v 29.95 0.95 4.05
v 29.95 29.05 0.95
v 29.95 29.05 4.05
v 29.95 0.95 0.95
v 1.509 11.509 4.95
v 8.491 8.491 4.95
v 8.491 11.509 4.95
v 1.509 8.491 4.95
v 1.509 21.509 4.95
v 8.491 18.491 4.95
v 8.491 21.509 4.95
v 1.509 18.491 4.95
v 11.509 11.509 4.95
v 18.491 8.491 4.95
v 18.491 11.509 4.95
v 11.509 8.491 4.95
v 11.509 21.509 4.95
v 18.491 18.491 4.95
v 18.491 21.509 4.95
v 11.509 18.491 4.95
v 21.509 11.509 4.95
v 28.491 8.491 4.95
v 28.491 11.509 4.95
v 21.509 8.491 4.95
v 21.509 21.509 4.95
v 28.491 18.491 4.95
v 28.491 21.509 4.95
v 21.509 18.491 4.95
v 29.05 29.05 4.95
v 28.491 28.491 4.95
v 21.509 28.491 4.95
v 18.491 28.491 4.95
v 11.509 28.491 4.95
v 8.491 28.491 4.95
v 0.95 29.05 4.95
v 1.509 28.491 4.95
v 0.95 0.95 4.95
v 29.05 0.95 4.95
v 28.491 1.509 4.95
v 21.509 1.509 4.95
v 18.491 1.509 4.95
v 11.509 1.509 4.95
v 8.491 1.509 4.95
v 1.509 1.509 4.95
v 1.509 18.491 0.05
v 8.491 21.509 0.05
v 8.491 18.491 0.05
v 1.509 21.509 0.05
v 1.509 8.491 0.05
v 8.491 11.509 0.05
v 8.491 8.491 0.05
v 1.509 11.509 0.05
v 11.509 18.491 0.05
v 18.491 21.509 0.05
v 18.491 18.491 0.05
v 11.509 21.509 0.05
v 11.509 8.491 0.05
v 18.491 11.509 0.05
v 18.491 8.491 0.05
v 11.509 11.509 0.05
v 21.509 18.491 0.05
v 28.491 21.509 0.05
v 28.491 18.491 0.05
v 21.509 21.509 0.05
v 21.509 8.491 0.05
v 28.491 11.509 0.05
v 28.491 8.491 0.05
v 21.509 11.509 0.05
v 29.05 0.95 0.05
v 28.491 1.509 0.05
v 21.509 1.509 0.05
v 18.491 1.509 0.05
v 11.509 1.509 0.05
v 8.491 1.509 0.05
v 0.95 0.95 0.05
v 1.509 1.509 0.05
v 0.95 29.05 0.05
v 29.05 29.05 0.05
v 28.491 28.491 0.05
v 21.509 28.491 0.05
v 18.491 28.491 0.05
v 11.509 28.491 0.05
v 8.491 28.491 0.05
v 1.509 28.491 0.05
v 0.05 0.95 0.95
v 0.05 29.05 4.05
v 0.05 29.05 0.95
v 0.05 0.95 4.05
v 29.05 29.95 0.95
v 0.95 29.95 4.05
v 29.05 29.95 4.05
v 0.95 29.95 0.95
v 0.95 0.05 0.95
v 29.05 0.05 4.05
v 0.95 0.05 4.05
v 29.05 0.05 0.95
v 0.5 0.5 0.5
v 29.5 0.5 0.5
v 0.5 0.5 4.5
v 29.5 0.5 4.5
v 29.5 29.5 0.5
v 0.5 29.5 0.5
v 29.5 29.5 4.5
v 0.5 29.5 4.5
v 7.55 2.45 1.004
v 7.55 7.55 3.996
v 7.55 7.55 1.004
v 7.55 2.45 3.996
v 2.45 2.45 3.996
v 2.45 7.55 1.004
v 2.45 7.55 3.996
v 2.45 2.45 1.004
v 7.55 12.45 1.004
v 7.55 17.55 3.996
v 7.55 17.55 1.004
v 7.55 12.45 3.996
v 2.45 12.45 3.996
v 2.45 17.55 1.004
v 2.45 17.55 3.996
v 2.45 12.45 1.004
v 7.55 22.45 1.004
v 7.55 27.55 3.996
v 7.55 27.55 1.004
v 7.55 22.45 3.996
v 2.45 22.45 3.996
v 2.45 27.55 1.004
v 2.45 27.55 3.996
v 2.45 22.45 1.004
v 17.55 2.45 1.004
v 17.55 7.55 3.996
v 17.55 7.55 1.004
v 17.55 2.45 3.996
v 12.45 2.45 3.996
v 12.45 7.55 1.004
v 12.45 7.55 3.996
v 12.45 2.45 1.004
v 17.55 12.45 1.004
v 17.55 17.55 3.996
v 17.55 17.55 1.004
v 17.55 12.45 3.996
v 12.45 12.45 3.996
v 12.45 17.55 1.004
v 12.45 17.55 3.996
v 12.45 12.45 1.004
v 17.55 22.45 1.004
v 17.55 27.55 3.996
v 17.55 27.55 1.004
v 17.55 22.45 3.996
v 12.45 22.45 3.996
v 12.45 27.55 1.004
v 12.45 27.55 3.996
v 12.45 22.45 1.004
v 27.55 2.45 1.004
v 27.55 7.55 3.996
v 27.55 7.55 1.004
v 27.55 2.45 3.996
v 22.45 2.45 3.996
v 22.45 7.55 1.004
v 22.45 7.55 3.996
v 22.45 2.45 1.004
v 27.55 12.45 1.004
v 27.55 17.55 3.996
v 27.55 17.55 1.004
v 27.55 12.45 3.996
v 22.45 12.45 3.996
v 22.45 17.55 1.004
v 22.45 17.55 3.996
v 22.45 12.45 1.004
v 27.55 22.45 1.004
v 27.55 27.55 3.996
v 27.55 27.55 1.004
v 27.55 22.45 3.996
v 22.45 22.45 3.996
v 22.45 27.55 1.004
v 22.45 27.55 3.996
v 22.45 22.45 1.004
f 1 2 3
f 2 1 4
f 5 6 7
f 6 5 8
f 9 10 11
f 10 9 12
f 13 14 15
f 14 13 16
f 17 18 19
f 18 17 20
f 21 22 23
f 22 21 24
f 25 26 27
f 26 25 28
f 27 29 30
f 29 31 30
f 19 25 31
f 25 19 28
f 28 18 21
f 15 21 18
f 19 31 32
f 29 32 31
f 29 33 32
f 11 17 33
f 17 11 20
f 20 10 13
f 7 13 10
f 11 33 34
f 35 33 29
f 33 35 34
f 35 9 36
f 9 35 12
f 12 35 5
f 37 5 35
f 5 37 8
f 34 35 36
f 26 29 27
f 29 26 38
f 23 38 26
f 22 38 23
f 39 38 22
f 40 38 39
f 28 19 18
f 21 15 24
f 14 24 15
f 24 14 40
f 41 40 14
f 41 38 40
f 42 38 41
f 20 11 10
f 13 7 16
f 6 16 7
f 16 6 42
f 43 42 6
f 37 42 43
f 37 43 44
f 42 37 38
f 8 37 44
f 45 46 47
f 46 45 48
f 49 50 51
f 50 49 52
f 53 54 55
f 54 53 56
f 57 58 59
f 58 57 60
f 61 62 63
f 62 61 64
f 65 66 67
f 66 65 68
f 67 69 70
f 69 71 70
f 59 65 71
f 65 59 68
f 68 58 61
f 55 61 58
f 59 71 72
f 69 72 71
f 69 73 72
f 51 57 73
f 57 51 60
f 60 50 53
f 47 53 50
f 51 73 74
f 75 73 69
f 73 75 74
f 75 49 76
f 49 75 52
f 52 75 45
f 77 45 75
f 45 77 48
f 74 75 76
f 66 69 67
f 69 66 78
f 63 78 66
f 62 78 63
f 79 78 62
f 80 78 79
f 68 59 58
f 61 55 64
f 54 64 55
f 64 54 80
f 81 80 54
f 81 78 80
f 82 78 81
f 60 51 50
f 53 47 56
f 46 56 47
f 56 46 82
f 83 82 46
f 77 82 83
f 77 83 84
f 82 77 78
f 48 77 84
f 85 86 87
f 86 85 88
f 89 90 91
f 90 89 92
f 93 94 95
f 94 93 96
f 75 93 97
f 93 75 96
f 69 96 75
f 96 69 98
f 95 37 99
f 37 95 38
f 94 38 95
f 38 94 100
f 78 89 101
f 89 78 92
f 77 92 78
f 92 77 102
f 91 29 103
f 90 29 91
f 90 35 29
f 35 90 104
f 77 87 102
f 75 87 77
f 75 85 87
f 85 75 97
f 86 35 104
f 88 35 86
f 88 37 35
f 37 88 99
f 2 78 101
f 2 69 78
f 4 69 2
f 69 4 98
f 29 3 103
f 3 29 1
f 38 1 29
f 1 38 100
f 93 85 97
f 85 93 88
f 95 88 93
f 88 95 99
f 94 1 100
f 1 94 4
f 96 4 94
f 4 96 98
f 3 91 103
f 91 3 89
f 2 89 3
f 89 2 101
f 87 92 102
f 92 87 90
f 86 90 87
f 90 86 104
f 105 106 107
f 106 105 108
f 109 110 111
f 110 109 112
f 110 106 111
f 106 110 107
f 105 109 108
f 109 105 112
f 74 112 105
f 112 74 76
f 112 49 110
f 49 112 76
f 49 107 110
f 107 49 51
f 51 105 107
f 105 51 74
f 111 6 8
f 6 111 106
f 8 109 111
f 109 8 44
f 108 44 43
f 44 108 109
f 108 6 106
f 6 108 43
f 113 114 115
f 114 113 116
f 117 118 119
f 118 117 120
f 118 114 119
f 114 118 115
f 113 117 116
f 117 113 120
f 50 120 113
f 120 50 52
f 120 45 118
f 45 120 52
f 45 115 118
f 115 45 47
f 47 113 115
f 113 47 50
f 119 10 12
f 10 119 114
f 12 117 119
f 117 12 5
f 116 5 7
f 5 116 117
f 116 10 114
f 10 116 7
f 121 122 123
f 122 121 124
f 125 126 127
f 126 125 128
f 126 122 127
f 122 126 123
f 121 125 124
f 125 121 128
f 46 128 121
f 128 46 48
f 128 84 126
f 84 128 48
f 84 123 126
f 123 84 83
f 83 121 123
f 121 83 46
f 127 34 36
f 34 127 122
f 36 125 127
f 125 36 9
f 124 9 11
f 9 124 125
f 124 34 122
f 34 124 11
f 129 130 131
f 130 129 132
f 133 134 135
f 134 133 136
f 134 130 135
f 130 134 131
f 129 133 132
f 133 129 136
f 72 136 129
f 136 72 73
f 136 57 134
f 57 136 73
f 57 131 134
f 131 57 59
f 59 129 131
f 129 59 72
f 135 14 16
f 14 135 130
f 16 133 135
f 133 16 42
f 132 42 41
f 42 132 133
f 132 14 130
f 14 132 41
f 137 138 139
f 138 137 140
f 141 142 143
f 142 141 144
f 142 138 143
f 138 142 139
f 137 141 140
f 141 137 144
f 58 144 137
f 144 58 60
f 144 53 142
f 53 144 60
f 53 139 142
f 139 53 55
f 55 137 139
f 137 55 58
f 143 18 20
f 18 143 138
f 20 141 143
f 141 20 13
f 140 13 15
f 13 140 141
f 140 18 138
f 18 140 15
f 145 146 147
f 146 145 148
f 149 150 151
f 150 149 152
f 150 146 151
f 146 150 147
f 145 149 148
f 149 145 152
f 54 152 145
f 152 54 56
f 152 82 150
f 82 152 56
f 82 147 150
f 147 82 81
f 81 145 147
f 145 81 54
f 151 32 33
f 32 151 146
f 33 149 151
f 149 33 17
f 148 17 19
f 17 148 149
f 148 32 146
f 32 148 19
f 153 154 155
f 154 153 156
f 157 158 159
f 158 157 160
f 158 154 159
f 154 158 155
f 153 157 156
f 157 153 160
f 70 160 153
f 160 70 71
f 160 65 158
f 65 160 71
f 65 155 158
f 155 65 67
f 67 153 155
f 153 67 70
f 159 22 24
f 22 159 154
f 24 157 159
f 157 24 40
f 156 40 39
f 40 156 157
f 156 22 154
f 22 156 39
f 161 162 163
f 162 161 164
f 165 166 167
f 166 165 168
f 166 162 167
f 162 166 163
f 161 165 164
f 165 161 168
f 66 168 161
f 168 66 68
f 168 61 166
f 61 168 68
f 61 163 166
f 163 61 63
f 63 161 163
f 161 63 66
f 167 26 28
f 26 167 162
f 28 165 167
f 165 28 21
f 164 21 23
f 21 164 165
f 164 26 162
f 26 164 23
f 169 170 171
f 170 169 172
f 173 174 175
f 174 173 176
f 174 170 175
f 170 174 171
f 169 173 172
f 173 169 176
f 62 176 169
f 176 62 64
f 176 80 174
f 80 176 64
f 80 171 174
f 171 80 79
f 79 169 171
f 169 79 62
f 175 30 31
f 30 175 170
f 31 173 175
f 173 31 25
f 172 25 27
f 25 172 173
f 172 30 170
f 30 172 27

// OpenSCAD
/* [HIDDEN] */
//QUALITY
$fn = 40;
D = 0.05;
F = 1.0;
// PLANE
H = 5;
W = 10;
// CLIP
CLIP = 5;
CLIP_F = 0.5;
CLIP_W = 1.5;
CLIP_L = 4.2;
// WHEEL
WHEEL_OUT_D = 52;
WHEEL_W = 3;
WHEEL_H = 20;
WHEEL_ARM_N = 5;
WHEEL_ARM_W = 4;
WHEEL_ARM_H = 10;
WHEEL_GEAR_N = 18;
// WHEEL PIN
WHEEL_PIN_D = 5.4;
WHEEL_PIN_L = 20;
// BEARING 688
BEAR_OUT_D = 16;
BEAR_IN_D = 8;
BEAR_H = 5;
// DC MOTOR
DC_PIN_D = 5.4;
DC_PIN_W = 3.6;
// SERVO
SERVO_D = 7.4;
SORVO_S = 2.2;
SERVO_T = 0.4;

/* [MODULES] */
MODULE = 2; // [1:Clips, 2:Plane, 3:Corner, 4:Servo Mount, 5:Servo Bracet, 6:Servo Pin, 7:Control Unit, 8:Control Unit Cap, 9:Battery Block, 10:Battery Block Cap]
/* [PARAMETERS] */
ROWS = 3; // [1:20]
COLS = 3; // [1:20]
ROWS_CORNER = 3; // [1:10]
HEIGHT = 1; // [1:0.5:10]


if (MODULE == 1){
    clips();
} else if (MODULE == 2){
    plane(ROWS, COLS, HEIGHT);
} else if (MODULE == 3){
    corner(ROWS, ROWS_CORNER, COLS);
} else if (MODULE == 4){
    servo_joint();
} else if (MODULE == 5){
    servo_bracet();
} else if (MODULE == 6){
    servo_pin();
} else if (MODULE == 7){
    control_block();
} else if (MODULE == 8){
    control_block_cap();
} else if (MODULE == 9){
    battery_block();
} else if (MODULE == 10){
    battery_cap();
} 

// UTILS:
// 1. clip_gap();
// 2. solid_plane(r, c);
// 3. bevel(r, c, h);
// 4. pyramid4(a, h);
// 5. prizm3rect(a, h);

module control_block_cap(){
    difference(){
        plane(9, 9, 1.2);
        translate([0, 0, 4.95])
            cube([11, 11, 1.1]);
        translate([79, 0, 4.95])
            cube([11, 11, 1.1]);
        translate([0, 79, 4.95])
            cube([11, 11, 1.1]);
        translate([79, 79, 4.95])
            cube([11, 11, 1.1]);
    }
}

module battery_cap(){
    difference(){
        union(){
            plane(5,9);
            translate([1,1,0.05])
                cube([8,8,4.9]);
            translate([41,1,0.05])
                cube([8,8,4.9]);
            translate([1,81,0.05])
                cube([8,8,4.9]);
            translate([41,81,0.05])
                cube([8,8,4.9]);
        }
        translate([3, 3, 0])
            cylinder(d=2.5, h=10, center=true);
        translate([3, 90-3, 0])
            cylinder(d=2.5, h=10, center=true);
        translate([50-3, 3, 0])
            cylinder(d=2.5, h=10, center=true);
        translate([50-3, 90-3, 0])
            cylinder(d=2.5, h=10, center=true);
        translate([2.5,2.5,2.5])
            cylinder(d=10, h=3);
        translate([50-2.5,2.5,2.5])
            cylinder(d=10, h=3);
        translate([2.5,90-2.5,2.5])
            cylinder(d=10, h=3);
        translate([50-2.5,90-2.5,2.5])
            cylinder(d=10, h=3);
    }
}

module battery_block(){
    difference(){
        union(){
            difference(){
                plane(5,9, 7);
                translate([4.5, 5, 7])
                    cube([41, 80, 28]);
                translate([6, 0, 6])
                    cube([38, 5.1, 28]);
                translate([6, 84.9, 6])
                    cube([38, 5.1, 28]);
                translate([0, 6, 6])
                    cube([5.0, 78, 28]);
                translate([45, 6, 6])
                    cube([5.0, 78, 28]);
            }
            
            translate([5, 5, 5])
                rotate([90, 0, 0])
                    plane(4, 3);
            translate([5, 90, 5])
                rotate([90, 0, 0])
                    plane(4, 3);
            translate([5, 5, 5])
                rotate([0,-90,0])
                    plane(3,8);
            translate([50, 5, 5])
                rotate([0,-90,0])
                    plane(3,8);
        }
        translate([4.5, 5, 7])
            cube([41, 80, 28]);
        
        translate([21, 0, 0])
            cube([8, 9, 5]);
        translate([21, 5, 0])
            cube([8, 5, 10]);
        
        translate([21, 81, 0])
            cube([8, 9, 5]);
        translate([21, 80, 0])
            cube([8, 5, 10]);
        
        translate([3, 3, 35])
            cylinder(d=2.5, h=10, center=true);
        translate([3, 90-3, 35])
            cylinder(d=2.5, h=10, center=true);
        translate([50-3, 3, 35])
            cylinder(d=2.5, h=10, center=true);
        translate([50-3, 90-3, 35])
            cylinder(d=2.5, h=10, center=true);
    }
    translate([4, 34, 20])
        cube([1, 2, 5]);
    translate([4, 54, 20])
        cube([1, 2, 5]);
    translate([45, 34, 20])
        cube([1, 2, 5]);
    translate([45, 54, 20])
        cube([1, 2, 5]);
    
}

module control_block(){
    dw = 2;
    dh = H + dw;
    h = 7;
    w = 9;
    servo_h = 13;
    union(){
        difference(){
            plane(w, w, h);
            // inner space
            translate([dw, dw, dh])
                cube([w*W-dw*2, w*W-dw*2, h*H]);
            // servo pins gap
            translate([22, 0, 0])
                cube([66, 10, dh + servo_h]);
            // servo power gap
            translate([51, 0, dh+18])
                cube([10, dw+1, 5]);
            // power connector gap
            //translate([dw, 0, dh])
            //    cube([4, dw+1, 8]);
            // power button gap
            translate([w*W-3, 75, dh])
                cube([4, 12, 20]);
            //translate([w*W-3, 75, dh+20.5])
            //    cube([4, 4, 35]);
            // shield bower gap
            translate([w*W-3, 58, dh+4])
                cube([4, 20, 16]);
            // arduino nano usb gap
            translate([w*W-3, 44, dh+16])
                cube([4, 10, 6]);
            // side gaps
            translate([0, 0, H*h-3])
                cube([90, 90, 4]);
            
            
        }
        // joints
        translate([0, 0, (h-1)*H])
            upper_joint();
        translate([(w)*W, W, (h-1)*H])
            rotate([0, 0, 180])
                upper_joint();
        translate([0, (w-1)*W, (h-1)*H])
            upper_joint();
        translate([(w-1)*W, (w-0)*W, (h-1)*H])
            rotate([0, 0, -90])
                upper_joint();
        //translate([(w-1)*W, (w-3)*W, (h-1)*H])
        //    upper_joint();
        
        // pca9685 mount
        translate([25, 13, dh])
            cube([5, dw, 5]);
        translate([25, 17, dh])
            cube([5, dw, 5]);
        translate([82, 13, dh])
            cube([7, dw, 25]);
        translate([82, 17, dh])
            cube([7, dw, 25]);
        translate([27.5, 14, dh+3])  
            sphere(d=3.0,$fn=12);
        translate([27.5, 18, dh+3])  
            sphere(d=3.0,$fn=12);
        translate([84, 14, dh+3])  
            sphere(d=3.0,$fn=12);
        translate([84, 18, dh+3])  
            sphere(d=3.0,$fn=12); 
        // dc converter mount
        translate([10, 24, dh])
            cube([10, 2, 5]);
        translate([10, 70, dh])
            cube([10, 2, 5]);
        translate([2, 45, dh])
            cube([2, 10, 5]);
        translate([25, 45, dh])
            cube([5, 10, 5]);
        translate([7, 34, dh])
            cylinder(d=2.2, h=5);
        translate([22, 64, dh])
            cylinder(d=2.2, h=5);
        // io shield mount
        translate([50, 20, dh])
            cube([10, 2, 5]);
        translate([50, 75.5, dh])
            cube([10, 2, 5]);
        translate([32.5, 40, dh])
            cylinder(d=2.2, h=5);
        translate([32.5, 67, dh])
            cylinder(d=2.2, h=5);
        translate([83.5, 25, dh])
            cylinder(d=2.2, h=5);
        translate([84.5, 73, dh])
            cylinder(d=2.2, h=5);
        // bluetooth mount
        translate([20, 83, dh])
            cube([2, 5, 15]);
        translate([30, 80, dh])
            cube([5, 2, 15]);
        translate([30, 86, dh])
            cube([5, 3, 15]);
        translate([57, 80, dh])
            difference(){
                cube([5, 8, 20]);
                translate([-1, 2, 0])
                    cube([4, 2.5, 21]);
            }
        
    }
    
}

module upper_joint(){
    union(){
        translate([0, 0, H])
            mirror([0,0,1])
                plane(1,1,1.5);
        translate([0.5, 1, -9])
            rotate([0, 45, 0])
                cube([1.0, 8, 11]);
    }
}


module wheel(){
    union(){
        difference(){ 
            cylinder(d=WHEEL_OUT_D, h=WHEEL_H);
            translate([0,0,-D]) cylinder(d=WHEEL_OUT_D-WHEEL_W*2, h=WHEEL_H+D*2); 
        }
        difference(){ 
            cylinder(d=WHEEL_W*2+WHEEL_PIN_D, h=WHEEL_H);
            translate([0, 0, -D]) intersection(){
                cylinder(d=WHEEL_PIN_D+2*D, h=WHEEL_H+2*D);
                translate([-DC_PIN_D/2-F/2, -DC_PIN_W/2-D, 0]) cube([DC_PIN_D+F, DC_PIN_W+2*D, WHEEL_H+2*D]);
            }
        }
        for (i = [0:WHEEL_ARM_N-1]){
            rotate([0, 0, (360*i)/WHEEL_ARM_N]) 
                translate([WHEEL_W+WHEEL_PIN_D/2-F, -WHEEL_ARM_W/2, 0]) 
                    cube([WHEEL_OUT_D/2 - WHEEL_W - WHEEL_PIN_D/2, WHEEL_ARM_W, WHEEL_ARM_H]);
        }
        for (i = [0:WHEEL_GEAR_N-1]){
            rotate([0,0,(360*i)/WHEEL_GEAR_N])
                translate([0, WHEEL_OUT_D/2-D*2, WHEEL_H/2]) 
                    rotate([-90, 0, 0]) 
                        track_pin(2*F, 2*W-2*F-2*D, H/2, [0.7, 0.8]);
        }
    }
}

module wheel_pin(){
    translate([0, 0, DC_PIN_W/2])
    rotate([90, 0, 0])
    union(){
        intersection(){
            cylinder(d=BEAR_IN_D+D*2, h=BEAR_H);
            translate([-BEAR_IN_D/2-D, -DC_PIN_W/2, 0]) 
                cube([BEAR_IN_D+D*2, BEAR_IN_D+D*2, BEAR_H]);
        
        }
        intersection(){
            translate([0,0,H]) 
                cylinder(d=WHEEL_PIN_D, h=WHEEL_PIN_L-H);
            translate([-DC_PIN_D/2-F/2, -DC_PIN_W/2, H]) 
                cube([DC_PIN_D+F, DC_PIN_W, WHEEL_PIN_L-H]);
        }
    }
}

module wheel_mount(){
    r = 2;
    c = 2;
    dr = (r - floor(r))*W;
    dc = (c - floor(c))*W;
    difference(){
        solid_plane(r, c, 2.0);
        for (i = [0:r-1]){
            for (j = [0:c-1]){
               translate([(i+0.5)*W+dr, (j+0.5)*W+dc, 0]) clip_gap();
            }
        }
        translate([W, W, H+F]) cylinder(d=BEAR_OUT_D, h=BEAR_H+D);
        translate([W, W, H+F/2]) cylinder(d=BEAR_IN_D+2*F, h=BEAR_H+D+F);
    }
    
}

module track(){
    difference(){
        union(){
            difference(){
                union(){
                    // main
                    translate([0, D, D]) cube([W, 2*W-2*D, H-2*D]);
                    translate([2*D, D, H/2]) rotate([-90, 0, 0]) cylinder(h=2*W-2*D, d=H-2*D);
                    translate([W, D, H/2]) rotate([-90, 0, 0]) cylinder(h=2*W-2*D, d=H-2*D);
                    // pins
                    translate([F, H/2, H-D]) track_pin(2*F, H-2*D, F, 0.5);
                    translate([F, 2*W-H/2, H-D]) track_pin(2*F, H-2*D, F, 0.5);
                    translate([H, W, H-D]) track_pin(2*F, W-2*D, F, 0.5);
                }
                // minus gaps
                translate([-H/2, H-D, 0]) cube([H+D*2,W+D*2,H]);
                translate([H+H/2, 0, 0]) cube([H,H+D*2,H]);
                translate([H+H/2, W+H-D*2, 0]) cube([H,H+D*2,H]);
                // small gaps
                //translate([H+H/2, H+1.5, 0]) cube([H,F,H]);
                //translate([H+H/2, W+H-1.5-F, 0]) cube([H,F,H]);
                translate([H+H/2, H+F*2, 0]) cube([H,W-4*F,H]);
                
                // minus pins
                translate([H, W, 0]) track_pin(3*F, 2*W-2*F-2*D, H/2, [0.5, 0.8]);
            }
            // clips plus
            translate([W,H+D*2, H/2])   rotate([90, 0, 0]) track_clips();
            translate([W,W+H-D*2, H/2])   rotate([-90, 0, 0]) track_clips();
        }  
        // clips minus
        translate([0,H-D, H/2])   rotate([90, 0, 0]) track_clips();
        translate([0,W+H+D, H/2])   rotate([-90, 0, 0]) track_clips();
    } 
}

module track_pin(x, y, z, s){
    linear_extrude(height=z, scale=s) square(size=[x, y], center=true);
}

module track_clips(){
        linear_extrude(height=F*0.5, scale=0.8) circle(d=H-2*F);
}




module servo_pin(){
    difference(){
        cylinder(d=SERVO_D-SERVO_T, h=H-2);
        cylinder(d=SORVO_S, h=H);
        translate([0,0,H-2])
            cylinder(d=SERVO_D-3, h=2);
        
        
    }
    
}

module servo_mount(){
    union(){
        rotate([90, 0, 0])
        linear_extrude(height=16.5, scale=[4.4/SERVO_D, 1])
            translate([-SERVO_D/2, -2.0])
                square([SERVO_D, 4]);
        cylinder(d=SERVO_D,h=4, center=true);
        translate([0, -16.5])
            cylinder(d=4.4,h=4, center=true);
    }
}

module servo_bracet(){
    r = 3;
    c = 3;
    
    dr = (r - floor(r))*W;
    dc = (c - floor(c))*W;
    difference()
    {
        solid_plane(4.5, 3);
        for (i = [0:r-1]){
            for (j = [0:2:c-1]){
               translate([(i+1.25)*W+dr, (j+0.5)*W+dc, 0]) clip_gap();
            }
        }
        translate([22.5,15,4])
            rotate([0,0,90])
                servo_mount();
        translate([22.5,15,4])
            rotate([0,0,-90])
                servo_mount();
        translate([22.5,15,0])
            cylinder(d=SERVO_D, h=5);
    }
    
    translate ([W-H, 0, 0]) 
        rotate ([0, -90, 0]) 
    difference(){
        solid_plane(3.5, 3);
            for (i = [0:r-1]){
            for (j = [0:2:c-1]){
               translate([(i+1.0)*W+dr, (j+0.5)*W+dc, 0]) clip_gap();
            }
        }
        translate([30,15,4])
            rotate([0,0,-90])
                servo_mount();
        translate([30,15,0])
            cylinder(d=SERVO_D, h=5);
        translate([5, 10, 0])
            cube([4,10,5]);
    }
    
    translate ([40+W-H, 0, 0]) 
        rotate ([0, -90, 0]) 
    difference(){
        solid_plane(3.5, 3);
            for (i = [0:r-1]){
            for (j = [0:2:c-1]){
               translate([(i+1.0)*W+dr, (j+0.5)*W+dc, 0]) clip_gap();
            }
        }
        translate([30,15,1])
            rotate([0,0,-90])
                servo_mount();
        translate([30,15,0])
            cylinder(d=SERVO_D, h=5);
        translate([5, 10, 0])
            cube([4,10,5]);
    }
}

module servo_joint(){
    r=3;
    c=3;
    dr = (r - floor(r))*W;
    dc = (c - floor(c))*W;
    difference()
    {
        solid_plane(3.5, 3, 7);
        translate([0, 9-SERVO_T/2, 23.5])
            cube([35, 12+SERVO_T, 11.5]);
        translate([5, 9-SERVO_T/2, 5])
            cube([25, 12+SERVO_T, 19]);
        translate([3.5, 15, 15])
            cylinder(d=SORVO_S, h=10);
        translate([35-3.5, 15, 15])
            cylinder(d=SORVO_S, h=10);
        translate([23, 15, 0])
            cylinder(d=SORVO_S, h=10);
        translate([25, 13, 5])
            cube([10, 4, 12]);
        rotate([90, 0, 0])
            for (i = [0:r-1]){
                for (j = [0:c-1]){
                    translate([(i+1.0)*W+dr, (j+0.75)*W+dc, -5]) clip_gap();
                    translate([(i+1.0)*W+dr, (j+0.75)*W+dc, -30]) clip_gap();
                }
            }
        rotate([0, -90, 0]){
            translate([(0.75)*W+dr, (0.5)*W+dc, -5]) 
                clip_gap();
            translate([(1.75)*W+dr, (0.5)*W+dc, -5]) 
                clip_gap();
            translate([(2.75)*W+dr, (0.5)*W+dc, -5]) 
                clip_gap();
            translate([(0.75)*W+dr, (2.5)*W+dc, -5]) 
                clip_gap();
            translate([(1.75)*W+dr, (2.5)*W+dc, -5]) 
                clip_gap();
            translate([(2.75)*W+dr, (2.5)*W+dc, -5]) 
                clip_gap();
        }
        
    }
}

module plane(r, c, h = 1){
    dr = (r - floor(r))*W;
    dc = (c - floor(c))*W;
    difference(){
        solid_plane(r, c, h);
        for (i = [0:r-1]){
            for (j = [0:c-1]){
               translate([(i+0.5)*W+dr, (j+0.5)*W+dc, 0]) clip_gap();
            }
        }
    }
}

module solid_plane(r, c, h=1){
    bevel (r, c, h) translate ([D, D, D])
        cube([r*W-2*D, c*W-2*D, h*H-2*D]);
}

module corner(r1, r2, c){
    plane(r1+H/W, c);
    translate ([W-H, 0, 0]) rotate ([0, -90, 0]) plane(r2+H/W, c);
}

module clips(){
        clips_main();
}

module clips_main(){
    translate([0,0,-CLIP/2]) linear_extrude(CLIP) 
        polygon([
            [-CLIP/2, -H],
            [-CLIP/2-CLIP_F,-H+CLIP_F],
            [-CLIP/2,-H+CLIP_F*2],
            [-CLIP/2, H-CLIP_F*2],
            [-CLIP/2-CLIP_F,H-CLIP_F],
            [-CLIP/2, H],
            [-CLIP/2+CLIP_W, H],
            [CLIP/2-CLIP_W, -H+CLIP_L],
            [CLIP/2-CLIP_W, H],
            [CLIP/2, H],
            [CLIP/2+CLIP_F, H-CLIP_F],
            [CLIP/2, H-CLIP_F*2],
            [CLIP/2, -H+CLIP_F*2],
            [CLIP/2+CLIP_F, -H+CLIP_F],
            [CLIP/2, -H],
            [CLIP/2-CLIP_W, -H],
            [-CLIP/2+CLIP_W, H-CLIP_L],
            [-CLIP/2+CLIP_W, -H],
            [-CLIP/2, -H]
        ]);
}

module clip_gap(){
    union(){
        translate([0, 0, H/2]) 
            cube([CLIP + 2*D, CLIP + 2*D, H], center=true);
        translate([0, 0, -D/5]) pyramid4(CLIP+CLIP_F*4+2*D, CLIP/2+CLIP_F*2+2*D);
        translate([0, 0, H+D/5]) rotate([180, 0, 0]) pyramid4(CLIP+CLIP_F*4+2*D, CLIP/2+CLIP_F*2+2*D);
    }
}

module gear(){
    
}

module bevel(r, c, h){
    difference(){
        children(0);
        // r
        translate ([0, 0, 0]) rotate ([90, 0, 90]) prizm3rect(F, r*W);
        translate ([0, 0, h*H]) rotate ([90, 90, 90]) prizm3rect(F, r*W);
        translate ([0, c*W, 0]) rotate ([90, 270, 90]) prizm3rect(F, r*W);
        translate ([0, c*W, h*H]) rotate ([90, 180, 90]) prizm3rect(F, r*W);
        // c
        translate ([0, 0, 0]) rotate ([90, 270, 180]) prizm3rect(F, c*W);
        translate ([0, 0, h*H]) rotate ([90, 180, 180]) prizm3rect(F, c*W);
        translate ([r*W, 0, 0]) rotate ([90, 0, 180]) prizm3rect(F, c*W);
        translate ([r*W, 0, h*H]) rotate ([90, 90, 180]) prizm3rect(F, c*W);
        // h
        prizm3rect(F, h*H);
        translate ([r*W, 0, 0]) rotate ([0, 0, 90]) prizm3rect(F, h*H);
        translate ([r*W, c*W, 0]) rotate ([0, 0, 180]) prizm3rect(F, h*H);
        translate ([0, c*W, 0]) rotate ([0, 0, 270]) prizm3rect(F, h*H);
        
    }
}

module prizm3rect(a, h){
    linear_extrude(h) polygon([[0,0], [0,a], [a,0]]);
}

module pyramid4(a, h){
    points = [[a/2, -a/2, 0], [-a/2, -a/2, 0], [-a/2, a/2, 0], [a/2, a/2, 0], [0, 0, h]];
    faces = [[3, 2, 1, 0], [0, 1, 4], [1, 2, 4], [2, 3, 4], [3, 0, 4]];
    polyhedron(points = points, faces = faces);
}
